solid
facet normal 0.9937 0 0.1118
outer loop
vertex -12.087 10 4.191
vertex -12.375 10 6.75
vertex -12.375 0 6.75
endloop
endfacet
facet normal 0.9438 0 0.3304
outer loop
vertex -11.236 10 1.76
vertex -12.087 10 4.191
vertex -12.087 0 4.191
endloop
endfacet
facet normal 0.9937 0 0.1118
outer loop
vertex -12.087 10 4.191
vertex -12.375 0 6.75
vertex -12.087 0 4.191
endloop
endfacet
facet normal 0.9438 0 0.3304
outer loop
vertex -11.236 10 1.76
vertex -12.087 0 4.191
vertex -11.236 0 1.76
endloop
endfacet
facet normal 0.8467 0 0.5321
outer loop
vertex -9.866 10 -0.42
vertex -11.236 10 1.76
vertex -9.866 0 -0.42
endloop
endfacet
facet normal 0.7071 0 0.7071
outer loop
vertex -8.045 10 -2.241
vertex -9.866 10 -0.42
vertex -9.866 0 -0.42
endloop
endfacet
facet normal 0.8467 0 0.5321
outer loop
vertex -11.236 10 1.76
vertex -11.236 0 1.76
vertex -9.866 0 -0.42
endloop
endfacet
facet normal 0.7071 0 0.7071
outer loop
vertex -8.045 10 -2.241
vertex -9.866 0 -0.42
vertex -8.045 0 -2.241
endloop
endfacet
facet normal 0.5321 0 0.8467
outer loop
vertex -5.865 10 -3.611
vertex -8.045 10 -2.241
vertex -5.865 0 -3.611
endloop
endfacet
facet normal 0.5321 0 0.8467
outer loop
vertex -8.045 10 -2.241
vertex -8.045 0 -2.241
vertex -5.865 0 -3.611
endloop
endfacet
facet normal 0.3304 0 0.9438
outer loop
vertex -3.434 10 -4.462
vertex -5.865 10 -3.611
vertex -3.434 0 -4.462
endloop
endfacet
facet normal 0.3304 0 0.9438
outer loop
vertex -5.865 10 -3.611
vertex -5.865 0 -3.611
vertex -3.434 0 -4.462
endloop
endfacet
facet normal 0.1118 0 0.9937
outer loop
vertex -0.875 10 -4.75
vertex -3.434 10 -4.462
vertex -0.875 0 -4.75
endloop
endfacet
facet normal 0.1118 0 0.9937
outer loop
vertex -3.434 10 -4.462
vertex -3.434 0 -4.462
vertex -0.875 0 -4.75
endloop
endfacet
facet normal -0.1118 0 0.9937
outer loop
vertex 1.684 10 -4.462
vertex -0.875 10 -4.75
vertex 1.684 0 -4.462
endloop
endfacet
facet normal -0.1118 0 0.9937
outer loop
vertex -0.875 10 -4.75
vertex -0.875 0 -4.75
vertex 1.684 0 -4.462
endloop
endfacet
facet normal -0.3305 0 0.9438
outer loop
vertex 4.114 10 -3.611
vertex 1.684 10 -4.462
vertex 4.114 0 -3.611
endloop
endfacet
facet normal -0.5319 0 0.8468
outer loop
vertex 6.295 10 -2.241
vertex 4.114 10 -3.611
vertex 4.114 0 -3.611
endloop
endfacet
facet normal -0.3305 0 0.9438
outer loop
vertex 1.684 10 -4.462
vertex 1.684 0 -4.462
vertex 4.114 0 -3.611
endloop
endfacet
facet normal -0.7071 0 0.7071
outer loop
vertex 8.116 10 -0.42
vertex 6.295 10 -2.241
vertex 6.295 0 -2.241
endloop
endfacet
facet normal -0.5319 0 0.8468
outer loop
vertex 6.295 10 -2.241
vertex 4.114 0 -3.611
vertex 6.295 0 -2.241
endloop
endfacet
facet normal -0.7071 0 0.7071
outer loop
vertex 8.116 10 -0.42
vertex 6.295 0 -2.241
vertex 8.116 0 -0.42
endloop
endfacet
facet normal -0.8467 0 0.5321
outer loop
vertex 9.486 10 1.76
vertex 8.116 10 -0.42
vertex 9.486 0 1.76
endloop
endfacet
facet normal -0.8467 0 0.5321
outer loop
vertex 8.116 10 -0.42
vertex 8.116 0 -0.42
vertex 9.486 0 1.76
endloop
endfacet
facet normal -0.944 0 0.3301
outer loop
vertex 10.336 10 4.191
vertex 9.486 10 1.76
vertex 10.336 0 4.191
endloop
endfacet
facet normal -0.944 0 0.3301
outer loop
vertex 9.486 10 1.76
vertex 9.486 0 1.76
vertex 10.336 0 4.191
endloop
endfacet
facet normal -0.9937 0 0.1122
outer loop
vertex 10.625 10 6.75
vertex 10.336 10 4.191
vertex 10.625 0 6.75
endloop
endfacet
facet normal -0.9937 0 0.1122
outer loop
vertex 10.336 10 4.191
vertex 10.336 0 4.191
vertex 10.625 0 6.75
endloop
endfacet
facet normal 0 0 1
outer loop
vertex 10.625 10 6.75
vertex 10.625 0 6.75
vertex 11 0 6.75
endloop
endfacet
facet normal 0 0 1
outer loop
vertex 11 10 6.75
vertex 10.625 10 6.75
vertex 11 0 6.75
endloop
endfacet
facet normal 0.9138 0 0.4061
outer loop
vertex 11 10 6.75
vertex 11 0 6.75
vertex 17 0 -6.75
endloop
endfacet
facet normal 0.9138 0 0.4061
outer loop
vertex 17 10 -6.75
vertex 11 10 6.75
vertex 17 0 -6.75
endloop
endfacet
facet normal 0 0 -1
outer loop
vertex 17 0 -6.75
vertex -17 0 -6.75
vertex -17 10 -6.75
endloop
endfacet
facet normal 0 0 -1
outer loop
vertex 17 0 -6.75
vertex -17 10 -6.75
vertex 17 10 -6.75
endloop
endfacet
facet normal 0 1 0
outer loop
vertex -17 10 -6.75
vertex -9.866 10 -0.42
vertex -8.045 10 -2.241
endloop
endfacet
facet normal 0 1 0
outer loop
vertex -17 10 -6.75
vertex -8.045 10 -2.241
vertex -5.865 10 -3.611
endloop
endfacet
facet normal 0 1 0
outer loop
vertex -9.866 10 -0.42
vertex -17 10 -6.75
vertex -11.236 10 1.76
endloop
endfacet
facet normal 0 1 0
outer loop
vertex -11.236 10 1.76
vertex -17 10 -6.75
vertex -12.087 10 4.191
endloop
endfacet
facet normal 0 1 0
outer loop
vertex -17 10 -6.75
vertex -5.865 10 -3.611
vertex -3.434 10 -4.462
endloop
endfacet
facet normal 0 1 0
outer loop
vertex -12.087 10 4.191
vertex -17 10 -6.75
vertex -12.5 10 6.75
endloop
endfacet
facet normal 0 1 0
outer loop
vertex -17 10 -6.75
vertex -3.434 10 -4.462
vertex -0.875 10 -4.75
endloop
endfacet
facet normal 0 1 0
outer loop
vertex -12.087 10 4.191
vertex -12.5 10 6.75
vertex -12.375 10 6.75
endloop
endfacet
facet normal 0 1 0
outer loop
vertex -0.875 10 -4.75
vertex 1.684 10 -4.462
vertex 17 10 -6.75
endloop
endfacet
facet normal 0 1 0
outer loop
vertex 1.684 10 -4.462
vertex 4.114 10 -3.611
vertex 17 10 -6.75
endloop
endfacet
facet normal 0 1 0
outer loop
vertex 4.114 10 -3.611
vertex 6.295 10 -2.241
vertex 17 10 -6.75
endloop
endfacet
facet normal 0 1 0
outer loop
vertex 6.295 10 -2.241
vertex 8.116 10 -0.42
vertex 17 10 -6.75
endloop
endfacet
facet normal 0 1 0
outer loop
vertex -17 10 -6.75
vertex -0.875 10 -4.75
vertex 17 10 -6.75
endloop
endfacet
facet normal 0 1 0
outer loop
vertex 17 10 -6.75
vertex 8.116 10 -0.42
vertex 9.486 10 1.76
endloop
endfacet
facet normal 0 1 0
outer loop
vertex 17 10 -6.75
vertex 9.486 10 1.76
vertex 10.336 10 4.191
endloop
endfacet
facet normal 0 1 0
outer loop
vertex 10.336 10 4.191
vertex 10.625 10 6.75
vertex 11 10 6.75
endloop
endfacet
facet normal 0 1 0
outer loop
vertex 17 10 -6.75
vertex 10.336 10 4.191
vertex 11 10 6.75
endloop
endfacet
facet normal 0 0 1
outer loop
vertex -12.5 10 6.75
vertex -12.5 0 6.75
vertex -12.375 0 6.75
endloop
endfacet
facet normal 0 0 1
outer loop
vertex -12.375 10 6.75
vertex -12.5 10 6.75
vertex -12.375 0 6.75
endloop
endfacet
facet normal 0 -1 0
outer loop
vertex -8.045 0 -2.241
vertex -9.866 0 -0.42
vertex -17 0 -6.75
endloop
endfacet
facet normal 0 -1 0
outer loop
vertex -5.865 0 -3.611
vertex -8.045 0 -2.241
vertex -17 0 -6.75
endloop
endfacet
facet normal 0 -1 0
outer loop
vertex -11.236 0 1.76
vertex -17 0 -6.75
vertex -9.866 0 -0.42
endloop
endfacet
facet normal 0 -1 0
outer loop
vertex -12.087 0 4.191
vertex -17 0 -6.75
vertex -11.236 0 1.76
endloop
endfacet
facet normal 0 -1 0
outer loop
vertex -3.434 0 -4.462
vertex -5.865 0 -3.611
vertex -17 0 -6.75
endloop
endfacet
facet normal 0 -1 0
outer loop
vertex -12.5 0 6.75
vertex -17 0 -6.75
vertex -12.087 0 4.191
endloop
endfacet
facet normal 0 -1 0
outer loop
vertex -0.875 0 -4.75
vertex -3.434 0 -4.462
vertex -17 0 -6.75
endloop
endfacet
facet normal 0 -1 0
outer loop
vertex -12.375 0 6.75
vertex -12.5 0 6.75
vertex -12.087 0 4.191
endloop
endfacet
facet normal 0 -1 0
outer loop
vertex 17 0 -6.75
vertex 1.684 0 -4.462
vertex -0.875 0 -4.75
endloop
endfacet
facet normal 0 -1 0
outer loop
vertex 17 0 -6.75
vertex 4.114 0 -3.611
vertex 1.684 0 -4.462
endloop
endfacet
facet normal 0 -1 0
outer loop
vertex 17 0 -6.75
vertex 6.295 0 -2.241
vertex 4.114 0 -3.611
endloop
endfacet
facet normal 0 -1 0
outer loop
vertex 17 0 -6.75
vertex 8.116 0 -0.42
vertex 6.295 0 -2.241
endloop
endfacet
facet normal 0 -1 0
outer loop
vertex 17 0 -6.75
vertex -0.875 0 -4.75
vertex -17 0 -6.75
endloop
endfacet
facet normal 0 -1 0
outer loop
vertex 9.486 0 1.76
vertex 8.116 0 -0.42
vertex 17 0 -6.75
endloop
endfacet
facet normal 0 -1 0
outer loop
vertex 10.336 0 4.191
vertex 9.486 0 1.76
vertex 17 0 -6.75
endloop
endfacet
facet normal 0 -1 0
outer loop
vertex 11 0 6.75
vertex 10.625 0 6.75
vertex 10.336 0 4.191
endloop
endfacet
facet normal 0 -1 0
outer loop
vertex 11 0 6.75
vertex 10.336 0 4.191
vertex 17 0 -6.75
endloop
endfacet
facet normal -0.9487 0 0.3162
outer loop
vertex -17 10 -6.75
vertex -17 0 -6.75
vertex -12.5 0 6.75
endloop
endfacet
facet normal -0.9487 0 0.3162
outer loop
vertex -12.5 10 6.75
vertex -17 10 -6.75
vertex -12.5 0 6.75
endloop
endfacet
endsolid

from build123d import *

# Parameters (mm, degrees)
F0_W     = 34
F0_H     = 13.5
F1_DEPTH = 10
F2_R     = 11.5
F3_DEPTH = 10.001


with BuildPart() as f1:
    # F0 (on Front) → F1 (new body)
    with BuildSketch(Plane.XZ):
        Rectangle(F0_W, F0_H)
    extrude(amount=-F1_DEPTH)

    # F2 (on face) → F3 (cut, through all)
    with BuildSketch(Plane.XZ):
        with Locations((-0.875213, 6.75)):
            Circle(F2_R)
        Polygon((-17, -6.75), (-12.5, 6.75), (-17, 6.75), align=None)
        Polygon((11, 6.75), (17, -6.75), (17, 6.75), align=None)
    extrude(amount=-F3_DEPTH, mode=Mode.SUBTRACT)


solid = f1.part
